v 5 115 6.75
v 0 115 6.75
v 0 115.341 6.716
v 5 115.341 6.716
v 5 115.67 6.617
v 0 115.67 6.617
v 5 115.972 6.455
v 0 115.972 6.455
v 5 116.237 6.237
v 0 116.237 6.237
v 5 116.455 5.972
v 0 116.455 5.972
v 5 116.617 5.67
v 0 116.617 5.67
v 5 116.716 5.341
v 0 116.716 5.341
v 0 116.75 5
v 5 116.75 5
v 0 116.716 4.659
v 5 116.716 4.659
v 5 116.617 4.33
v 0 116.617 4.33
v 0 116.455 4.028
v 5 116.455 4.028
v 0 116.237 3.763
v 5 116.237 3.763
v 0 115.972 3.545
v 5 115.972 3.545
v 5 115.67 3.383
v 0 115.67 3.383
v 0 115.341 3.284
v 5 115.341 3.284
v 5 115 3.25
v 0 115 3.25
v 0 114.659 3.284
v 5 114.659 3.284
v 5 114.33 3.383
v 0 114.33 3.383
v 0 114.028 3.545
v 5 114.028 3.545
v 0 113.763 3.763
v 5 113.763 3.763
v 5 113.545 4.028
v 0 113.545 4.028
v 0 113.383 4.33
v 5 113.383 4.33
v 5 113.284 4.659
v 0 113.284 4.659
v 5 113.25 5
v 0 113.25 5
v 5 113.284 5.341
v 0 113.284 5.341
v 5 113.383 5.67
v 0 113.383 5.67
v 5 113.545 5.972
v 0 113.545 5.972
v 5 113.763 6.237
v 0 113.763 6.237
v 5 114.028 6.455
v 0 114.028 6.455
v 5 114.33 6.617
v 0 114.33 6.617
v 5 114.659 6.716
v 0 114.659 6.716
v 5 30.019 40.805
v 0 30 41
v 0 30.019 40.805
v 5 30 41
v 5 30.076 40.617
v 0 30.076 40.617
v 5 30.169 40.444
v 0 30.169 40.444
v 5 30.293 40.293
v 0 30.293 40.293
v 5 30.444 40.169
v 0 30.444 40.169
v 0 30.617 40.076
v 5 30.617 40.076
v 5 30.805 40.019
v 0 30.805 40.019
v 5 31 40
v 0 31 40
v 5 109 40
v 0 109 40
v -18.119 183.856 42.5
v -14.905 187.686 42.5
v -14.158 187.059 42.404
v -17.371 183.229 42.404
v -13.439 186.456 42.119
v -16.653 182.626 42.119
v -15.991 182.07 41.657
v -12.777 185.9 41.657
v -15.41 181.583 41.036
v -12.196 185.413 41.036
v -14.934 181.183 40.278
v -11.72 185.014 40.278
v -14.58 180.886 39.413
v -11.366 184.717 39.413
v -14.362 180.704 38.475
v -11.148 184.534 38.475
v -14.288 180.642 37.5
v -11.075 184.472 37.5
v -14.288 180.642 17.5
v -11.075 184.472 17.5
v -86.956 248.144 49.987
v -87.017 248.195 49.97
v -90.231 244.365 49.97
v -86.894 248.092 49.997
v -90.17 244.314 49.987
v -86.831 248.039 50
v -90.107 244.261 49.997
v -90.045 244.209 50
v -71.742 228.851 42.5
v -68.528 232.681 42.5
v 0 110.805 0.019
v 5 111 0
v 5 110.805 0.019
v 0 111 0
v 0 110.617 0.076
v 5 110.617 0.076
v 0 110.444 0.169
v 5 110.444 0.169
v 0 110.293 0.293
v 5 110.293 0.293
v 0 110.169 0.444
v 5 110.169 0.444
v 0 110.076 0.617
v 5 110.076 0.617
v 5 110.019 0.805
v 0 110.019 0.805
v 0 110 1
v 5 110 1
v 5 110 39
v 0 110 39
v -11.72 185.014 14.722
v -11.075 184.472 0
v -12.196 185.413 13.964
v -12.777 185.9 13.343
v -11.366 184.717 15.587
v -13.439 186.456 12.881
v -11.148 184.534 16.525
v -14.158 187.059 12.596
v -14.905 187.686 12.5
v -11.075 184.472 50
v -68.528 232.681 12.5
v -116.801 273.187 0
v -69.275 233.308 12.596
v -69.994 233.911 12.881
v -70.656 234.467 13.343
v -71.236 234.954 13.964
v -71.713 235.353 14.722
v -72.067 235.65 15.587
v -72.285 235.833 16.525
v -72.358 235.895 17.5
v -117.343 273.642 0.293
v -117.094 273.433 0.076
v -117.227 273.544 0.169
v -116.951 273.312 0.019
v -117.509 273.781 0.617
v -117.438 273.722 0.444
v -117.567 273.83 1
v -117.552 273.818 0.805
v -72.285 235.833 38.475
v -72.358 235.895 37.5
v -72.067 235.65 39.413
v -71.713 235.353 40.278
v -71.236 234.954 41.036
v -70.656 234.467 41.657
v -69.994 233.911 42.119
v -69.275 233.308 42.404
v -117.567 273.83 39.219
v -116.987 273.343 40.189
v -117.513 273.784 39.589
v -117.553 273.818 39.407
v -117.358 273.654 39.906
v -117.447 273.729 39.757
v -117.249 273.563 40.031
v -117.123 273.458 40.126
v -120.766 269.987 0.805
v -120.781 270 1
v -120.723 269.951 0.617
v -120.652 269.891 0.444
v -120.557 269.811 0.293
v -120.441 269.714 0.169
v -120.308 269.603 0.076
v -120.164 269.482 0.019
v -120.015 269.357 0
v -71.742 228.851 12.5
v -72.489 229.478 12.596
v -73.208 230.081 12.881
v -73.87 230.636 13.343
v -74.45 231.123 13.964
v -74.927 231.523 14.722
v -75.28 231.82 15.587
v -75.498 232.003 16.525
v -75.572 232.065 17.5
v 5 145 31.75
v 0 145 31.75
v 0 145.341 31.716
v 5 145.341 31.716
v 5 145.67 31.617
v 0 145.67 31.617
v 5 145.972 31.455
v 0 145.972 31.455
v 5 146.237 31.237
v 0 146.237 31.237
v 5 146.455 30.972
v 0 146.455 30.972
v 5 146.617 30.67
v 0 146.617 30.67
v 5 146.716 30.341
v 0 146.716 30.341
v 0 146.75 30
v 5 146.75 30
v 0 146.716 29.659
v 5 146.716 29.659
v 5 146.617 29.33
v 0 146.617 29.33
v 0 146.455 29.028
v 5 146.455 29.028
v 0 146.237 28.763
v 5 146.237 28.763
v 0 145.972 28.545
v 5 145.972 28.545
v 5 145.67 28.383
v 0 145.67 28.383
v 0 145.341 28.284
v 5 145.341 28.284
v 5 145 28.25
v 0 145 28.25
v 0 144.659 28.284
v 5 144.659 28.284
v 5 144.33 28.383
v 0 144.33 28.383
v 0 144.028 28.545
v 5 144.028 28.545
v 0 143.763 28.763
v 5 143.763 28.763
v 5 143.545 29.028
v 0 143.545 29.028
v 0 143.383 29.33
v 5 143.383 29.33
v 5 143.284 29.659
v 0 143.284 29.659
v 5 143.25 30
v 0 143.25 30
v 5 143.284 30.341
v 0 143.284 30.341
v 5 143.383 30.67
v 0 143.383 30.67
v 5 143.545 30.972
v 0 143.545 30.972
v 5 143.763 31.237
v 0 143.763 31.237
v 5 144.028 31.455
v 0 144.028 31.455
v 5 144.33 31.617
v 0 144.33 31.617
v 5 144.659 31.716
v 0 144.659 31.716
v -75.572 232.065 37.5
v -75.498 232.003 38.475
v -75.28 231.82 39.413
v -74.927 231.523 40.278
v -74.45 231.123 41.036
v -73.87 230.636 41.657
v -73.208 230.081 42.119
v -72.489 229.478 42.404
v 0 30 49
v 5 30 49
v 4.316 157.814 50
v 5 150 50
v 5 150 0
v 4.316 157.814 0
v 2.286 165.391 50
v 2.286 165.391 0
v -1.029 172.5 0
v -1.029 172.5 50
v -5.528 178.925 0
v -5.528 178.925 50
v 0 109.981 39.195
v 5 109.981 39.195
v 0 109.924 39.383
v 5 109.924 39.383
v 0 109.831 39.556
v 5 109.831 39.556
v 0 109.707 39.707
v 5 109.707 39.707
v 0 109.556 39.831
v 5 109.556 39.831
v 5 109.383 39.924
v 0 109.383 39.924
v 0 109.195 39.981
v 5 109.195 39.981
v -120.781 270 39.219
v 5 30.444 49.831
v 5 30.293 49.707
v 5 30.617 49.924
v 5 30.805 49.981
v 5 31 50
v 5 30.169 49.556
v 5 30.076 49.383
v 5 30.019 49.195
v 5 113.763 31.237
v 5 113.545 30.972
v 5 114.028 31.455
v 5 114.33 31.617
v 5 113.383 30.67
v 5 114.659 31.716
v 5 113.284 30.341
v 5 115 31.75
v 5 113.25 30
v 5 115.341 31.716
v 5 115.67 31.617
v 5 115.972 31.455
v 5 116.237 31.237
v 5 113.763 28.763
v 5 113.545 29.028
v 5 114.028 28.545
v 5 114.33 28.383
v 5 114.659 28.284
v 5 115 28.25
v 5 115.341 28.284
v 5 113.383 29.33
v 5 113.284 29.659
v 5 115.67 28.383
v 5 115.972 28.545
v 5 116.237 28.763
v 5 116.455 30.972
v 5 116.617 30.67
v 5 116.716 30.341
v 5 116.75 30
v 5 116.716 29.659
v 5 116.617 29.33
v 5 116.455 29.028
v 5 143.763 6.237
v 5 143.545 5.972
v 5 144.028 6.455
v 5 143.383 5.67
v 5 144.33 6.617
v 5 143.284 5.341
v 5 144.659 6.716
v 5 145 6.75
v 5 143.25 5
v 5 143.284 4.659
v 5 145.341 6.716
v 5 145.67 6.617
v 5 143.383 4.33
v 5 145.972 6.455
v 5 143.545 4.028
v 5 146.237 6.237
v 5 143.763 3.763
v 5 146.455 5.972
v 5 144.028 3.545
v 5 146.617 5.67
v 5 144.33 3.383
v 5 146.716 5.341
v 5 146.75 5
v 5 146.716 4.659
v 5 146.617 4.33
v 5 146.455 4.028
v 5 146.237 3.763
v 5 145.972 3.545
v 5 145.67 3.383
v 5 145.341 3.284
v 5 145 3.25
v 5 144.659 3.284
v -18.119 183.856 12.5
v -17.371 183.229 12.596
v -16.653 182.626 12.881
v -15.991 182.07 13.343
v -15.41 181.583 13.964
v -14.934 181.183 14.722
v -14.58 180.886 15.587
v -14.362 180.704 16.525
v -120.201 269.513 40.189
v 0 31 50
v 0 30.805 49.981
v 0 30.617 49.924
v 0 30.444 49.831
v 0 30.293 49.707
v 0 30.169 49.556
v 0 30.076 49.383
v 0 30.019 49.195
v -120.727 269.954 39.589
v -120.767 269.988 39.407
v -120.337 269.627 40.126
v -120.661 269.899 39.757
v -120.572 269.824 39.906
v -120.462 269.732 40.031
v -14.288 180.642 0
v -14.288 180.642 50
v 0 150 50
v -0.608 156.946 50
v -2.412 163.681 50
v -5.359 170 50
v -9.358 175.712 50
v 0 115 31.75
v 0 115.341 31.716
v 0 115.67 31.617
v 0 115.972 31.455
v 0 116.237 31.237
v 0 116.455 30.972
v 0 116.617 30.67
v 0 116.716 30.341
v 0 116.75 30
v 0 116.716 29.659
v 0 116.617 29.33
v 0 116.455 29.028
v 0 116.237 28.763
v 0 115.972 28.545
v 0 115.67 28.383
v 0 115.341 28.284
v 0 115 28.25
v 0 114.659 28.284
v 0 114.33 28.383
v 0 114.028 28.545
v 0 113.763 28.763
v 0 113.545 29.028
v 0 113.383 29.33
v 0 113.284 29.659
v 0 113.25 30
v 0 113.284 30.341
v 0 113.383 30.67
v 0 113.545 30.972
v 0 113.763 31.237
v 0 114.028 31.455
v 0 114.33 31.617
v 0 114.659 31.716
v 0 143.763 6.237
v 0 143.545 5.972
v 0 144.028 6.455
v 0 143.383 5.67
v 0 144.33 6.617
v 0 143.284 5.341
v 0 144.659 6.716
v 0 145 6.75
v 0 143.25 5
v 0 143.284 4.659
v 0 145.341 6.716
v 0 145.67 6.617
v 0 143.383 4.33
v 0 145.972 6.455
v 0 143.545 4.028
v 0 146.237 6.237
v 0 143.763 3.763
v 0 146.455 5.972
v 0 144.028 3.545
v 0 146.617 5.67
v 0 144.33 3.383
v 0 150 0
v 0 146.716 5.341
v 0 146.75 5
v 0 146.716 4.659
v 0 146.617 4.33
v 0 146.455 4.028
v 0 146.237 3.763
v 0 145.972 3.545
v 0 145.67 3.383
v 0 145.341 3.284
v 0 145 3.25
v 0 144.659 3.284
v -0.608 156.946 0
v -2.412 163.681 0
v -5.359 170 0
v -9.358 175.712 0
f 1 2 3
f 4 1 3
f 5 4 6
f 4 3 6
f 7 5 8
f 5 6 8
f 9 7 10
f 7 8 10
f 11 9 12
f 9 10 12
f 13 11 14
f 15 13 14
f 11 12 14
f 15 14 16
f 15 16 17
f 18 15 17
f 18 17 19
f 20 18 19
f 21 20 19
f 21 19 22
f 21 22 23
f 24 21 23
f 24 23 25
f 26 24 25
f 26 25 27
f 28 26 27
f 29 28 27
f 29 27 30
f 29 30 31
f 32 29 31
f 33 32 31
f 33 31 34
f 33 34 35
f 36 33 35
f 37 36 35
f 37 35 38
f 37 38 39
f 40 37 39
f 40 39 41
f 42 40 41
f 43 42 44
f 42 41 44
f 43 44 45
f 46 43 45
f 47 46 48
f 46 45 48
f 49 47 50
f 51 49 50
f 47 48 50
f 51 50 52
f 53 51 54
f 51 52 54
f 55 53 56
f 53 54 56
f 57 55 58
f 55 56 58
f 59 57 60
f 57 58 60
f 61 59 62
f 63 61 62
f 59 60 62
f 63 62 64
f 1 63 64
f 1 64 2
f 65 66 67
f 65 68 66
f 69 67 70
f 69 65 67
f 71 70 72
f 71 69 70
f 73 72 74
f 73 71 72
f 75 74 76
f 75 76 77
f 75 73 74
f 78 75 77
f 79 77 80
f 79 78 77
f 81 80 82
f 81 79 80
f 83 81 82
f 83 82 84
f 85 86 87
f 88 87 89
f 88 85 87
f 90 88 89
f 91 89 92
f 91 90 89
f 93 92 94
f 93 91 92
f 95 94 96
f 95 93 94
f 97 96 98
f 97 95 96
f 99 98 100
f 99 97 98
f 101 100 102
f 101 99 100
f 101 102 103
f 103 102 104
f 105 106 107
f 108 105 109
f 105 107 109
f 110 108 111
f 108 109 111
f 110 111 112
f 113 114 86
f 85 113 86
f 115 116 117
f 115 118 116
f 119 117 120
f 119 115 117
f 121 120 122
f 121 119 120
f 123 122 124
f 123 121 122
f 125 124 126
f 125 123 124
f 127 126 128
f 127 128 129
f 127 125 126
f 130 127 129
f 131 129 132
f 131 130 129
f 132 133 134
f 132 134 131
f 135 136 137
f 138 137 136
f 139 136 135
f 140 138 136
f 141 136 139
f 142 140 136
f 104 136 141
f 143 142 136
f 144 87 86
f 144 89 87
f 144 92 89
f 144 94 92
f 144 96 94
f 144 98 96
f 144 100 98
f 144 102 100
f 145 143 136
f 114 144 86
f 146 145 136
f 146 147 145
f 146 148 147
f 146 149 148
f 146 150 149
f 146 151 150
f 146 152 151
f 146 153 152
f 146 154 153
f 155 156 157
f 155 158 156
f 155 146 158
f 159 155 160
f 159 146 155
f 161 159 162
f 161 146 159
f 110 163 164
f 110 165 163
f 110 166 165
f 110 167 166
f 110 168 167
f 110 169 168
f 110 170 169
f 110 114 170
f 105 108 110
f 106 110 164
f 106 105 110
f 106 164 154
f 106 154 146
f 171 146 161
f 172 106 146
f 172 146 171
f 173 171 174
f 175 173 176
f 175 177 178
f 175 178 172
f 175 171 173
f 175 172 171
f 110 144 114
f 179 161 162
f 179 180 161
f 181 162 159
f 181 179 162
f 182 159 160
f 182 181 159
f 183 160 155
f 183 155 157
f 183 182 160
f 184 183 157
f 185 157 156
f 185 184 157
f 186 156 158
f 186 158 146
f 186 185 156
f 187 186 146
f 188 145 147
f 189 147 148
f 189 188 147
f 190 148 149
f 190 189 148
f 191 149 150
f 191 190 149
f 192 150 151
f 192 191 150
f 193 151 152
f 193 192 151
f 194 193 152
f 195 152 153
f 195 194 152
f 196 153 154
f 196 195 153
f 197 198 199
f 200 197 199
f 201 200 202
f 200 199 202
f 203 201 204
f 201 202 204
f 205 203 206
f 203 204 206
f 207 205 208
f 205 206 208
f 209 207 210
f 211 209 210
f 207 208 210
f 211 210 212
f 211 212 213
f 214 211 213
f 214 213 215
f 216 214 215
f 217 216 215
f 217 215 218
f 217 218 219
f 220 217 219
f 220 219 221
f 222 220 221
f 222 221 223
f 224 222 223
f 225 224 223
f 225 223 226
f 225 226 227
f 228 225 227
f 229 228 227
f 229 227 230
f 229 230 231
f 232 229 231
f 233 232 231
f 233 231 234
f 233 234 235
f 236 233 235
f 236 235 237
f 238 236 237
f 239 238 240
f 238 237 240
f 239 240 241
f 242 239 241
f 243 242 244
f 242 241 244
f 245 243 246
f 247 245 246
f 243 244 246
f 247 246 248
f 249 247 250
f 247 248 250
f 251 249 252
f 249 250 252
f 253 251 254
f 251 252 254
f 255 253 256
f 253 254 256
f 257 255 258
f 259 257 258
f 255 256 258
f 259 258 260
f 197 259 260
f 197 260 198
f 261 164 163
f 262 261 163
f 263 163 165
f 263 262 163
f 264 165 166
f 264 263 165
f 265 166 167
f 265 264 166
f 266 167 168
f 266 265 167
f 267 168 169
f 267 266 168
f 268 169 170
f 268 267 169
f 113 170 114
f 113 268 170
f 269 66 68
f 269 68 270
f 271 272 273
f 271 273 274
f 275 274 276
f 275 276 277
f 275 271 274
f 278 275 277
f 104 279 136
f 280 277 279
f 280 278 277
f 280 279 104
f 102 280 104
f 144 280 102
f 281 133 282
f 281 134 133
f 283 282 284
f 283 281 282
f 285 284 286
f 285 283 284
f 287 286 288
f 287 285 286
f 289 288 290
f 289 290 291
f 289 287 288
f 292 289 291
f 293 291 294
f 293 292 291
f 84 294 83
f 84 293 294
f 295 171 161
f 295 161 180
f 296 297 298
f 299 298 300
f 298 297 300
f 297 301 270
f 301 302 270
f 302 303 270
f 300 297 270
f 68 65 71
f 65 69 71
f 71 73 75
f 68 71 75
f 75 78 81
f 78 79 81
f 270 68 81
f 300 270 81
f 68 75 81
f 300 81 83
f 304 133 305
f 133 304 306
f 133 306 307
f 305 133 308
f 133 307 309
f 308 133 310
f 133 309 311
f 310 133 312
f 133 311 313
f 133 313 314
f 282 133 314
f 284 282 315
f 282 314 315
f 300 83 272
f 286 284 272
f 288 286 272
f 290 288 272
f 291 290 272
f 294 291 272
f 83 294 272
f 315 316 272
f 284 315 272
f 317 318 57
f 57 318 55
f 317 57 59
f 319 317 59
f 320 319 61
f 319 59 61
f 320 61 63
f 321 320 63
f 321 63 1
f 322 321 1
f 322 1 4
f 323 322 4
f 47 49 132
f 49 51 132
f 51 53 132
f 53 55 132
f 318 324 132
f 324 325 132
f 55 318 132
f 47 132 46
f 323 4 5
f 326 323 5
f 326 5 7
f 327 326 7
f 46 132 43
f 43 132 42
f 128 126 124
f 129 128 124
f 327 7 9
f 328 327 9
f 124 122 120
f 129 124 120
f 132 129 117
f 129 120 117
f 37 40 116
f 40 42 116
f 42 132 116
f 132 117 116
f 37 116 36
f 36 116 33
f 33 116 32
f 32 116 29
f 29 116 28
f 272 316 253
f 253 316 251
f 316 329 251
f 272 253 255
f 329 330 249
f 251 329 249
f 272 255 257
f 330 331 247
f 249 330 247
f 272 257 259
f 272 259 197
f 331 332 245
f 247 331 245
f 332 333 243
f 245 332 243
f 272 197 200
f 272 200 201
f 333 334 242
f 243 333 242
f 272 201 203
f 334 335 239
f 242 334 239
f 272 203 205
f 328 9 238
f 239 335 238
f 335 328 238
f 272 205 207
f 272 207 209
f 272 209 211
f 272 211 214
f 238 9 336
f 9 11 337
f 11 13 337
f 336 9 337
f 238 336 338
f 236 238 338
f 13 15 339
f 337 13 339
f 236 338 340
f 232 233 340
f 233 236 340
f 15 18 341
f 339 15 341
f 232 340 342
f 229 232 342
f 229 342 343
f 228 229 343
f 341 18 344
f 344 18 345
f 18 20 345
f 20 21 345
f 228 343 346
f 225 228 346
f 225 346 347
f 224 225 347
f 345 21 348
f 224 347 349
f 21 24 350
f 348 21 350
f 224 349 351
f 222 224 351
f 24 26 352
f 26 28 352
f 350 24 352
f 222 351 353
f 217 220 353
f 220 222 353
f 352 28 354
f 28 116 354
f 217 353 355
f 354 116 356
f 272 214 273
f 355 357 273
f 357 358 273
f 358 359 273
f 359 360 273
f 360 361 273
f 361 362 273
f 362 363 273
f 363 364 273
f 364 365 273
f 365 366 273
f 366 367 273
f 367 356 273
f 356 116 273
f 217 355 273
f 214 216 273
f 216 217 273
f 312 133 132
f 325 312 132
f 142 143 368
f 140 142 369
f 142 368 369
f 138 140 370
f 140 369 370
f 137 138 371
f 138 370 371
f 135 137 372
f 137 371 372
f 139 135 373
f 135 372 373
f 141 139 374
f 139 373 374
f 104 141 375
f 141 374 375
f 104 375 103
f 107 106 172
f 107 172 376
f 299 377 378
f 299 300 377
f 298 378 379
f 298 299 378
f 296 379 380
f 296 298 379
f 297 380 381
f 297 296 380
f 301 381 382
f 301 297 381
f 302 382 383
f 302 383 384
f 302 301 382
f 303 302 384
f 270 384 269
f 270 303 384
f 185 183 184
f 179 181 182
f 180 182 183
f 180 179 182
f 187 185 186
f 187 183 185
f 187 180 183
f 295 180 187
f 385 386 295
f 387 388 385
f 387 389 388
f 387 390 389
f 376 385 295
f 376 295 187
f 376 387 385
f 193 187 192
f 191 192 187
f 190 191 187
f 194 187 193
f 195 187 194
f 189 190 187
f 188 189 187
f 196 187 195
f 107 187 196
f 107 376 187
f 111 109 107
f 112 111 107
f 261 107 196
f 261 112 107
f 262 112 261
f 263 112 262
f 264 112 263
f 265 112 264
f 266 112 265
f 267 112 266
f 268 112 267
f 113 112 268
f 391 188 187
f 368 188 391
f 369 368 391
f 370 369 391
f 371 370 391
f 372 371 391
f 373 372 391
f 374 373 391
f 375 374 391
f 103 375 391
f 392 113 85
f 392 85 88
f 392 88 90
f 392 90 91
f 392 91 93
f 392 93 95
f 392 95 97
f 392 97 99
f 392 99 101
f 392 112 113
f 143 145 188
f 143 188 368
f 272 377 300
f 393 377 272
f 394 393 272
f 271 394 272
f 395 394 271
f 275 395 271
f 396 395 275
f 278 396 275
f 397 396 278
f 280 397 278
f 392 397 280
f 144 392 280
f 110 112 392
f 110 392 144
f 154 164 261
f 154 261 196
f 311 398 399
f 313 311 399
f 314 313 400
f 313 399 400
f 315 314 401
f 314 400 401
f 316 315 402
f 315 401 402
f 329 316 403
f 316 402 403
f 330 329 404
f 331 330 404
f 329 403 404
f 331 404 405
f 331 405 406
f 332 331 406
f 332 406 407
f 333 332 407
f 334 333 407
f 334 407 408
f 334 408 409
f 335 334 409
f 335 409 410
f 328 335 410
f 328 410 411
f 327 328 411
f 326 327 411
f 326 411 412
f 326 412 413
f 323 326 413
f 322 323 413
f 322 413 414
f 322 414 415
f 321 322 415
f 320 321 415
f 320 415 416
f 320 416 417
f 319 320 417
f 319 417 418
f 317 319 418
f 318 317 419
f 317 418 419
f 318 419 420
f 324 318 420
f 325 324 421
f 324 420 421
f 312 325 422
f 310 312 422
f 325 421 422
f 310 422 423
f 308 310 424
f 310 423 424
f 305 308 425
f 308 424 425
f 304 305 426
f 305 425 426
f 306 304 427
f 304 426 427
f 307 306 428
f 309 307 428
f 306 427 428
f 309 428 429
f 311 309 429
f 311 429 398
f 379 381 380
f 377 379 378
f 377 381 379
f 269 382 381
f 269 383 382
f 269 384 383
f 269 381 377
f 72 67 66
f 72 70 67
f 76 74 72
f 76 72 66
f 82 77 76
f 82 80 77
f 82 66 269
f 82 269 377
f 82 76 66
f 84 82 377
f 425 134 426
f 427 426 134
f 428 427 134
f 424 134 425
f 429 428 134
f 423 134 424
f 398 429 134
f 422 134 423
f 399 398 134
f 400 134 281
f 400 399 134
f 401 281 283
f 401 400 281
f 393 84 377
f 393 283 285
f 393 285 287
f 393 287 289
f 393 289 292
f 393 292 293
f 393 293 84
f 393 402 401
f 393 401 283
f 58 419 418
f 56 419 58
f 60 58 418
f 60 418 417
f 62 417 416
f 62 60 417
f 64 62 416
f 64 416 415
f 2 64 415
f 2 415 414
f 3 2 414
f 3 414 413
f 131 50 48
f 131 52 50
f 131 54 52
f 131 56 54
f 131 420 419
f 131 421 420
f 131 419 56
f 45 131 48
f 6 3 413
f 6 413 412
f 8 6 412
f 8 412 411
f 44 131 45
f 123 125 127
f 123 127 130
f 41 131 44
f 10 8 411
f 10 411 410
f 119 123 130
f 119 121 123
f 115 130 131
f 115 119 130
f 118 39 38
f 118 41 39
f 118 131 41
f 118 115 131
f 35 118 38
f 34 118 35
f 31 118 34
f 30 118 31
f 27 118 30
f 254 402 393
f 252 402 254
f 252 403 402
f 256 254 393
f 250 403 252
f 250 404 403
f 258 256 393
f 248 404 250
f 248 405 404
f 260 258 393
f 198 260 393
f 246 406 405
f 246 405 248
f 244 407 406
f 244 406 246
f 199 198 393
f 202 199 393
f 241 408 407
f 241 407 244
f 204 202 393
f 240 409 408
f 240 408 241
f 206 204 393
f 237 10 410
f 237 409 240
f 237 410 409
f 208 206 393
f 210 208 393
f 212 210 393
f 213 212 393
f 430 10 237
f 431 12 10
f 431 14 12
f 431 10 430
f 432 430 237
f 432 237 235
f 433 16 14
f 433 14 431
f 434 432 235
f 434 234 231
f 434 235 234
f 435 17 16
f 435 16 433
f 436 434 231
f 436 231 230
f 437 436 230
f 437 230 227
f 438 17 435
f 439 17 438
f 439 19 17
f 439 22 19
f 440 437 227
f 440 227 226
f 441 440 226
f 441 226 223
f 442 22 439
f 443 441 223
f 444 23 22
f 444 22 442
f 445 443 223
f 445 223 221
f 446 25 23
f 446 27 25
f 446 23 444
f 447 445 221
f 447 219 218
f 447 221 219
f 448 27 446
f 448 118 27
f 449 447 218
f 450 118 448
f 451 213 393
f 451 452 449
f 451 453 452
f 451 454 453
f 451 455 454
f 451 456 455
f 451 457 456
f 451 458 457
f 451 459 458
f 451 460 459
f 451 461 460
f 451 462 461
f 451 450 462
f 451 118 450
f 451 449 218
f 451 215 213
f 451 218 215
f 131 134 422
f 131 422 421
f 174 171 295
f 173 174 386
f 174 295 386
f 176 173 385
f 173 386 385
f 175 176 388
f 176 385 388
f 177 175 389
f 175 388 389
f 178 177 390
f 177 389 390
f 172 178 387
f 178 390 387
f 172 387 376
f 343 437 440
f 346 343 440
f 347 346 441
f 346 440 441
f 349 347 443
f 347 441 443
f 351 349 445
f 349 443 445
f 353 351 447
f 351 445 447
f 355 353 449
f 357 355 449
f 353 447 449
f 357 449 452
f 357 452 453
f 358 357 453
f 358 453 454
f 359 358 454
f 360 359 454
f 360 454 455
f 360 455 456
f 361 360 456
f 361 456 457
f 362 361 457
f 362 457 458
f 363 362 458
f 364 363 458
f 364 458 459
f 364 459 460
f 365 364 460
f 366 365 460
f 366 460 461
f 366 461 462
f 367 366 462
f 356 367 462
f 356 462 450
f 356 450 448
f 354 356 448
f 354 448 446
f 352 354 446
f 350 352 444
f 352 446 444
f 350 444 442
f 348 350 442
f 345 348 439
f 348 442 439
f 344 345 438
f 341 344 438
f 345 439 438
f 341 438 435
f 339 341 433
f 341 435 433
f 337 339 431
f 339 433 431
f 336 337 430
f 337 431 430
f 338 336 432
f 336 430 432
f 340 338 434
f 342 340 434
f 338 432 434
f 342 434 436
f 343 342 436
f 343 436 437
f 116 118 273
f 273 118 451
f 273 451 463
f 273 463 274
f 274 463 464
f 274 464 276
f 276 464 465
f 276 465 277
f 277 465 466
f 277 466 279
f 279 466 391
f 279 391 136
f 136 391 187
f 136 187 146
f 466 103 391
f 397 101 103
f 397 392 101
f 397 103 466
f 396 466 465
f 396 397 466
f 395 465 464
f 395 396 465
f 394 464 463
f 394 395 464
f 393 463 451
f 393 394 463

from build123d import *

# Parameters (mm, degrees)
SKETCH1_W          = 5
SKETCH1_H          = 150
BASE_FLANGE1_DEPTH = 50
EDGE_FLANGE2_DEPTH = 50
SKETCH2_W          = 40
SKETCH2_H          = 110
CUT_EXTRUDE1_DEPTH = 10
SKETCH6_R          = 1.75
CUT_EXTRUDE2_DEPTH = 10
SKETCH12_W         = 10
SKETCH12_H         = 30
CUT_EXTRUDE3_DEPTH = 10
CHAMFER1_SIZE      = 10
CHAMFER1_SIZE2     = 40
FILLET1_R          = 1
SKETCH17_W         = 80
SKETCH17_H         = 30
CUT_EXTRUDE6_DEPTH = 10
FILLET2_R          = 5


# Sheet-metal steps are written as plain solids
with BuildPart() as part:
    # Sketch1 → Base-Flange1 (new body)
    with BuildSketch(Plane.XY):
        with Locations((2.5, 75)):
            Rectangle(SKETCH1_W, SKETCH1_H)
    extrude(amount=BASE_FLANGE1_DEPTH)

    # Edge-Flange2 section (across the edge) → Edge-Flange2 (add)
    with BuildSketch(Plane(origin=(0, 168.652306326, 50), x_dir=(-0.6427876096865435, -0.7660444431189746, 0), z_dir=(0, 0, -1))):
        with BuildLine():
            Line((-5, 18.652306326), (-5, 157.668461709))
            Line((-5, 157.668461709), (0, 157.668461709))
            Line((0, 157.668461709), (0, 18.652306326))
            ThreePointArc((0, 18.652306326), (3.747688519, 1.747575857), (14.288495613, -11.989471399))
            Line((14.288495613, -11.989471399), (11.074557564, -15.819693614))
            ThreePointArc((11.074557564, -15.819693614), (-0.783850417, -0.365515452), (-5, 18.652306326))
        make_face()
    extrude(amount=EDGE_FLANGE2_DEPTH)

    # Sketch2 → Cut-Extrude1 (cut)
    with BuildSketch(Plane(origin=(5, 0, 0), x_dir=(0, 0, -1), z_dir=(1, 0, 0))):
        with Locations((-20, 55)):
            Rectangle(SKETCH2_W, SKETCH2_H)
    extrude(amount=-CUT_EXTRUDE1_DEPTH, mode=Mode.SUBTRACT)

    # Sketch6 → Cut-Extrude2 (cut)
    with BuildSketch(Plane.ZY):
        with Locations((30, 115)):
            Circle(SKETCH6_R)
        with Locations((5, 115)):
            Circle(SKETCH6_R)
        with Locations((5, 145)):
            Circle(SKETCH6_R)
        with Locations((30, 145)):
            Circle(SKETCH6_R)
    extrude(amount=-CUT_EXTRUDE2_DEPTH, mode=Mode.SUBTRACT)

    # Sketch12 → Cut-Extrude3 (cut)
    with BuildSketch(Plane.ZY):
        with Locations((45, 15)):
            Rectangle(SKETCH12_W, SKETCH12_H)
    extrude(amount=-CUT_EXTRUDE3_DEPTH, mode=Mode.SUBTRACT)

    # Chamfer1
    chamfer1_edges = [part.edges().sort_by_distance(p)[0] for p in [
        (-119.174079923, 271.914751059, 50),
    ]]
    chamfer1_side = [part.faces().sort_by_distance(p)[0] for p in [
        (-119.174079923, 271.914751059, 25),
    ]]
    chamfer(chamfer1_edges, length=CHAMFER1_SIZE, length2=CHAMFER1_SIZE2, reference=chamfer1_side[0])

    # Fillet1
    fillet1_edges = [part.edges().sort_by_distance(p)[0] for p in [
        (-88.532302198, 246.203246672, 50),
        (-119.174079923, 271.914751059, 40),
        (-119.174079923, 271.914751059, 0),
        (2.5, 110, 0),
        (2.5, 110, 40),
        (2.5, 30, 40),
        (2.5, 30, 50),
    ]]
    fillet(fillet1_edges, radius=FILLET1_R)

    # Sketch17 → Cut-Extrude6 (cut)
    with BuildSketch(Plane(origin=(86.258987465, 102.799458205, 0), x_dir=(0.7660444431189746, -0.6427876096865437, 0), z_dir=(0.6427876096865437, 0.7660444431189746, 0))):
        with Locations((-167.059919178, -27.5)):
            Rectangle(SKETCH17_W, SKETCH17_H)
    extrude(amount=-CUT_EXTRUDE6_DEPTH, mode=Mode.SUBTRACT)

    # Fillet2
    fillet2_edges = [part.edges().sort_by_distance(p)[0] for p in [
        (-12.681526588, 182.556888833, 12.5),
        (-12.681526588, 182.556888833, 42.5),
        (-73.965082038, 233.979897607, 42.5),
        (-73.965082038, 233.979897607, 12.5),
    ]]
    fillet(fillet2_edges, radius=FILLET2_R)


solid = part.part
